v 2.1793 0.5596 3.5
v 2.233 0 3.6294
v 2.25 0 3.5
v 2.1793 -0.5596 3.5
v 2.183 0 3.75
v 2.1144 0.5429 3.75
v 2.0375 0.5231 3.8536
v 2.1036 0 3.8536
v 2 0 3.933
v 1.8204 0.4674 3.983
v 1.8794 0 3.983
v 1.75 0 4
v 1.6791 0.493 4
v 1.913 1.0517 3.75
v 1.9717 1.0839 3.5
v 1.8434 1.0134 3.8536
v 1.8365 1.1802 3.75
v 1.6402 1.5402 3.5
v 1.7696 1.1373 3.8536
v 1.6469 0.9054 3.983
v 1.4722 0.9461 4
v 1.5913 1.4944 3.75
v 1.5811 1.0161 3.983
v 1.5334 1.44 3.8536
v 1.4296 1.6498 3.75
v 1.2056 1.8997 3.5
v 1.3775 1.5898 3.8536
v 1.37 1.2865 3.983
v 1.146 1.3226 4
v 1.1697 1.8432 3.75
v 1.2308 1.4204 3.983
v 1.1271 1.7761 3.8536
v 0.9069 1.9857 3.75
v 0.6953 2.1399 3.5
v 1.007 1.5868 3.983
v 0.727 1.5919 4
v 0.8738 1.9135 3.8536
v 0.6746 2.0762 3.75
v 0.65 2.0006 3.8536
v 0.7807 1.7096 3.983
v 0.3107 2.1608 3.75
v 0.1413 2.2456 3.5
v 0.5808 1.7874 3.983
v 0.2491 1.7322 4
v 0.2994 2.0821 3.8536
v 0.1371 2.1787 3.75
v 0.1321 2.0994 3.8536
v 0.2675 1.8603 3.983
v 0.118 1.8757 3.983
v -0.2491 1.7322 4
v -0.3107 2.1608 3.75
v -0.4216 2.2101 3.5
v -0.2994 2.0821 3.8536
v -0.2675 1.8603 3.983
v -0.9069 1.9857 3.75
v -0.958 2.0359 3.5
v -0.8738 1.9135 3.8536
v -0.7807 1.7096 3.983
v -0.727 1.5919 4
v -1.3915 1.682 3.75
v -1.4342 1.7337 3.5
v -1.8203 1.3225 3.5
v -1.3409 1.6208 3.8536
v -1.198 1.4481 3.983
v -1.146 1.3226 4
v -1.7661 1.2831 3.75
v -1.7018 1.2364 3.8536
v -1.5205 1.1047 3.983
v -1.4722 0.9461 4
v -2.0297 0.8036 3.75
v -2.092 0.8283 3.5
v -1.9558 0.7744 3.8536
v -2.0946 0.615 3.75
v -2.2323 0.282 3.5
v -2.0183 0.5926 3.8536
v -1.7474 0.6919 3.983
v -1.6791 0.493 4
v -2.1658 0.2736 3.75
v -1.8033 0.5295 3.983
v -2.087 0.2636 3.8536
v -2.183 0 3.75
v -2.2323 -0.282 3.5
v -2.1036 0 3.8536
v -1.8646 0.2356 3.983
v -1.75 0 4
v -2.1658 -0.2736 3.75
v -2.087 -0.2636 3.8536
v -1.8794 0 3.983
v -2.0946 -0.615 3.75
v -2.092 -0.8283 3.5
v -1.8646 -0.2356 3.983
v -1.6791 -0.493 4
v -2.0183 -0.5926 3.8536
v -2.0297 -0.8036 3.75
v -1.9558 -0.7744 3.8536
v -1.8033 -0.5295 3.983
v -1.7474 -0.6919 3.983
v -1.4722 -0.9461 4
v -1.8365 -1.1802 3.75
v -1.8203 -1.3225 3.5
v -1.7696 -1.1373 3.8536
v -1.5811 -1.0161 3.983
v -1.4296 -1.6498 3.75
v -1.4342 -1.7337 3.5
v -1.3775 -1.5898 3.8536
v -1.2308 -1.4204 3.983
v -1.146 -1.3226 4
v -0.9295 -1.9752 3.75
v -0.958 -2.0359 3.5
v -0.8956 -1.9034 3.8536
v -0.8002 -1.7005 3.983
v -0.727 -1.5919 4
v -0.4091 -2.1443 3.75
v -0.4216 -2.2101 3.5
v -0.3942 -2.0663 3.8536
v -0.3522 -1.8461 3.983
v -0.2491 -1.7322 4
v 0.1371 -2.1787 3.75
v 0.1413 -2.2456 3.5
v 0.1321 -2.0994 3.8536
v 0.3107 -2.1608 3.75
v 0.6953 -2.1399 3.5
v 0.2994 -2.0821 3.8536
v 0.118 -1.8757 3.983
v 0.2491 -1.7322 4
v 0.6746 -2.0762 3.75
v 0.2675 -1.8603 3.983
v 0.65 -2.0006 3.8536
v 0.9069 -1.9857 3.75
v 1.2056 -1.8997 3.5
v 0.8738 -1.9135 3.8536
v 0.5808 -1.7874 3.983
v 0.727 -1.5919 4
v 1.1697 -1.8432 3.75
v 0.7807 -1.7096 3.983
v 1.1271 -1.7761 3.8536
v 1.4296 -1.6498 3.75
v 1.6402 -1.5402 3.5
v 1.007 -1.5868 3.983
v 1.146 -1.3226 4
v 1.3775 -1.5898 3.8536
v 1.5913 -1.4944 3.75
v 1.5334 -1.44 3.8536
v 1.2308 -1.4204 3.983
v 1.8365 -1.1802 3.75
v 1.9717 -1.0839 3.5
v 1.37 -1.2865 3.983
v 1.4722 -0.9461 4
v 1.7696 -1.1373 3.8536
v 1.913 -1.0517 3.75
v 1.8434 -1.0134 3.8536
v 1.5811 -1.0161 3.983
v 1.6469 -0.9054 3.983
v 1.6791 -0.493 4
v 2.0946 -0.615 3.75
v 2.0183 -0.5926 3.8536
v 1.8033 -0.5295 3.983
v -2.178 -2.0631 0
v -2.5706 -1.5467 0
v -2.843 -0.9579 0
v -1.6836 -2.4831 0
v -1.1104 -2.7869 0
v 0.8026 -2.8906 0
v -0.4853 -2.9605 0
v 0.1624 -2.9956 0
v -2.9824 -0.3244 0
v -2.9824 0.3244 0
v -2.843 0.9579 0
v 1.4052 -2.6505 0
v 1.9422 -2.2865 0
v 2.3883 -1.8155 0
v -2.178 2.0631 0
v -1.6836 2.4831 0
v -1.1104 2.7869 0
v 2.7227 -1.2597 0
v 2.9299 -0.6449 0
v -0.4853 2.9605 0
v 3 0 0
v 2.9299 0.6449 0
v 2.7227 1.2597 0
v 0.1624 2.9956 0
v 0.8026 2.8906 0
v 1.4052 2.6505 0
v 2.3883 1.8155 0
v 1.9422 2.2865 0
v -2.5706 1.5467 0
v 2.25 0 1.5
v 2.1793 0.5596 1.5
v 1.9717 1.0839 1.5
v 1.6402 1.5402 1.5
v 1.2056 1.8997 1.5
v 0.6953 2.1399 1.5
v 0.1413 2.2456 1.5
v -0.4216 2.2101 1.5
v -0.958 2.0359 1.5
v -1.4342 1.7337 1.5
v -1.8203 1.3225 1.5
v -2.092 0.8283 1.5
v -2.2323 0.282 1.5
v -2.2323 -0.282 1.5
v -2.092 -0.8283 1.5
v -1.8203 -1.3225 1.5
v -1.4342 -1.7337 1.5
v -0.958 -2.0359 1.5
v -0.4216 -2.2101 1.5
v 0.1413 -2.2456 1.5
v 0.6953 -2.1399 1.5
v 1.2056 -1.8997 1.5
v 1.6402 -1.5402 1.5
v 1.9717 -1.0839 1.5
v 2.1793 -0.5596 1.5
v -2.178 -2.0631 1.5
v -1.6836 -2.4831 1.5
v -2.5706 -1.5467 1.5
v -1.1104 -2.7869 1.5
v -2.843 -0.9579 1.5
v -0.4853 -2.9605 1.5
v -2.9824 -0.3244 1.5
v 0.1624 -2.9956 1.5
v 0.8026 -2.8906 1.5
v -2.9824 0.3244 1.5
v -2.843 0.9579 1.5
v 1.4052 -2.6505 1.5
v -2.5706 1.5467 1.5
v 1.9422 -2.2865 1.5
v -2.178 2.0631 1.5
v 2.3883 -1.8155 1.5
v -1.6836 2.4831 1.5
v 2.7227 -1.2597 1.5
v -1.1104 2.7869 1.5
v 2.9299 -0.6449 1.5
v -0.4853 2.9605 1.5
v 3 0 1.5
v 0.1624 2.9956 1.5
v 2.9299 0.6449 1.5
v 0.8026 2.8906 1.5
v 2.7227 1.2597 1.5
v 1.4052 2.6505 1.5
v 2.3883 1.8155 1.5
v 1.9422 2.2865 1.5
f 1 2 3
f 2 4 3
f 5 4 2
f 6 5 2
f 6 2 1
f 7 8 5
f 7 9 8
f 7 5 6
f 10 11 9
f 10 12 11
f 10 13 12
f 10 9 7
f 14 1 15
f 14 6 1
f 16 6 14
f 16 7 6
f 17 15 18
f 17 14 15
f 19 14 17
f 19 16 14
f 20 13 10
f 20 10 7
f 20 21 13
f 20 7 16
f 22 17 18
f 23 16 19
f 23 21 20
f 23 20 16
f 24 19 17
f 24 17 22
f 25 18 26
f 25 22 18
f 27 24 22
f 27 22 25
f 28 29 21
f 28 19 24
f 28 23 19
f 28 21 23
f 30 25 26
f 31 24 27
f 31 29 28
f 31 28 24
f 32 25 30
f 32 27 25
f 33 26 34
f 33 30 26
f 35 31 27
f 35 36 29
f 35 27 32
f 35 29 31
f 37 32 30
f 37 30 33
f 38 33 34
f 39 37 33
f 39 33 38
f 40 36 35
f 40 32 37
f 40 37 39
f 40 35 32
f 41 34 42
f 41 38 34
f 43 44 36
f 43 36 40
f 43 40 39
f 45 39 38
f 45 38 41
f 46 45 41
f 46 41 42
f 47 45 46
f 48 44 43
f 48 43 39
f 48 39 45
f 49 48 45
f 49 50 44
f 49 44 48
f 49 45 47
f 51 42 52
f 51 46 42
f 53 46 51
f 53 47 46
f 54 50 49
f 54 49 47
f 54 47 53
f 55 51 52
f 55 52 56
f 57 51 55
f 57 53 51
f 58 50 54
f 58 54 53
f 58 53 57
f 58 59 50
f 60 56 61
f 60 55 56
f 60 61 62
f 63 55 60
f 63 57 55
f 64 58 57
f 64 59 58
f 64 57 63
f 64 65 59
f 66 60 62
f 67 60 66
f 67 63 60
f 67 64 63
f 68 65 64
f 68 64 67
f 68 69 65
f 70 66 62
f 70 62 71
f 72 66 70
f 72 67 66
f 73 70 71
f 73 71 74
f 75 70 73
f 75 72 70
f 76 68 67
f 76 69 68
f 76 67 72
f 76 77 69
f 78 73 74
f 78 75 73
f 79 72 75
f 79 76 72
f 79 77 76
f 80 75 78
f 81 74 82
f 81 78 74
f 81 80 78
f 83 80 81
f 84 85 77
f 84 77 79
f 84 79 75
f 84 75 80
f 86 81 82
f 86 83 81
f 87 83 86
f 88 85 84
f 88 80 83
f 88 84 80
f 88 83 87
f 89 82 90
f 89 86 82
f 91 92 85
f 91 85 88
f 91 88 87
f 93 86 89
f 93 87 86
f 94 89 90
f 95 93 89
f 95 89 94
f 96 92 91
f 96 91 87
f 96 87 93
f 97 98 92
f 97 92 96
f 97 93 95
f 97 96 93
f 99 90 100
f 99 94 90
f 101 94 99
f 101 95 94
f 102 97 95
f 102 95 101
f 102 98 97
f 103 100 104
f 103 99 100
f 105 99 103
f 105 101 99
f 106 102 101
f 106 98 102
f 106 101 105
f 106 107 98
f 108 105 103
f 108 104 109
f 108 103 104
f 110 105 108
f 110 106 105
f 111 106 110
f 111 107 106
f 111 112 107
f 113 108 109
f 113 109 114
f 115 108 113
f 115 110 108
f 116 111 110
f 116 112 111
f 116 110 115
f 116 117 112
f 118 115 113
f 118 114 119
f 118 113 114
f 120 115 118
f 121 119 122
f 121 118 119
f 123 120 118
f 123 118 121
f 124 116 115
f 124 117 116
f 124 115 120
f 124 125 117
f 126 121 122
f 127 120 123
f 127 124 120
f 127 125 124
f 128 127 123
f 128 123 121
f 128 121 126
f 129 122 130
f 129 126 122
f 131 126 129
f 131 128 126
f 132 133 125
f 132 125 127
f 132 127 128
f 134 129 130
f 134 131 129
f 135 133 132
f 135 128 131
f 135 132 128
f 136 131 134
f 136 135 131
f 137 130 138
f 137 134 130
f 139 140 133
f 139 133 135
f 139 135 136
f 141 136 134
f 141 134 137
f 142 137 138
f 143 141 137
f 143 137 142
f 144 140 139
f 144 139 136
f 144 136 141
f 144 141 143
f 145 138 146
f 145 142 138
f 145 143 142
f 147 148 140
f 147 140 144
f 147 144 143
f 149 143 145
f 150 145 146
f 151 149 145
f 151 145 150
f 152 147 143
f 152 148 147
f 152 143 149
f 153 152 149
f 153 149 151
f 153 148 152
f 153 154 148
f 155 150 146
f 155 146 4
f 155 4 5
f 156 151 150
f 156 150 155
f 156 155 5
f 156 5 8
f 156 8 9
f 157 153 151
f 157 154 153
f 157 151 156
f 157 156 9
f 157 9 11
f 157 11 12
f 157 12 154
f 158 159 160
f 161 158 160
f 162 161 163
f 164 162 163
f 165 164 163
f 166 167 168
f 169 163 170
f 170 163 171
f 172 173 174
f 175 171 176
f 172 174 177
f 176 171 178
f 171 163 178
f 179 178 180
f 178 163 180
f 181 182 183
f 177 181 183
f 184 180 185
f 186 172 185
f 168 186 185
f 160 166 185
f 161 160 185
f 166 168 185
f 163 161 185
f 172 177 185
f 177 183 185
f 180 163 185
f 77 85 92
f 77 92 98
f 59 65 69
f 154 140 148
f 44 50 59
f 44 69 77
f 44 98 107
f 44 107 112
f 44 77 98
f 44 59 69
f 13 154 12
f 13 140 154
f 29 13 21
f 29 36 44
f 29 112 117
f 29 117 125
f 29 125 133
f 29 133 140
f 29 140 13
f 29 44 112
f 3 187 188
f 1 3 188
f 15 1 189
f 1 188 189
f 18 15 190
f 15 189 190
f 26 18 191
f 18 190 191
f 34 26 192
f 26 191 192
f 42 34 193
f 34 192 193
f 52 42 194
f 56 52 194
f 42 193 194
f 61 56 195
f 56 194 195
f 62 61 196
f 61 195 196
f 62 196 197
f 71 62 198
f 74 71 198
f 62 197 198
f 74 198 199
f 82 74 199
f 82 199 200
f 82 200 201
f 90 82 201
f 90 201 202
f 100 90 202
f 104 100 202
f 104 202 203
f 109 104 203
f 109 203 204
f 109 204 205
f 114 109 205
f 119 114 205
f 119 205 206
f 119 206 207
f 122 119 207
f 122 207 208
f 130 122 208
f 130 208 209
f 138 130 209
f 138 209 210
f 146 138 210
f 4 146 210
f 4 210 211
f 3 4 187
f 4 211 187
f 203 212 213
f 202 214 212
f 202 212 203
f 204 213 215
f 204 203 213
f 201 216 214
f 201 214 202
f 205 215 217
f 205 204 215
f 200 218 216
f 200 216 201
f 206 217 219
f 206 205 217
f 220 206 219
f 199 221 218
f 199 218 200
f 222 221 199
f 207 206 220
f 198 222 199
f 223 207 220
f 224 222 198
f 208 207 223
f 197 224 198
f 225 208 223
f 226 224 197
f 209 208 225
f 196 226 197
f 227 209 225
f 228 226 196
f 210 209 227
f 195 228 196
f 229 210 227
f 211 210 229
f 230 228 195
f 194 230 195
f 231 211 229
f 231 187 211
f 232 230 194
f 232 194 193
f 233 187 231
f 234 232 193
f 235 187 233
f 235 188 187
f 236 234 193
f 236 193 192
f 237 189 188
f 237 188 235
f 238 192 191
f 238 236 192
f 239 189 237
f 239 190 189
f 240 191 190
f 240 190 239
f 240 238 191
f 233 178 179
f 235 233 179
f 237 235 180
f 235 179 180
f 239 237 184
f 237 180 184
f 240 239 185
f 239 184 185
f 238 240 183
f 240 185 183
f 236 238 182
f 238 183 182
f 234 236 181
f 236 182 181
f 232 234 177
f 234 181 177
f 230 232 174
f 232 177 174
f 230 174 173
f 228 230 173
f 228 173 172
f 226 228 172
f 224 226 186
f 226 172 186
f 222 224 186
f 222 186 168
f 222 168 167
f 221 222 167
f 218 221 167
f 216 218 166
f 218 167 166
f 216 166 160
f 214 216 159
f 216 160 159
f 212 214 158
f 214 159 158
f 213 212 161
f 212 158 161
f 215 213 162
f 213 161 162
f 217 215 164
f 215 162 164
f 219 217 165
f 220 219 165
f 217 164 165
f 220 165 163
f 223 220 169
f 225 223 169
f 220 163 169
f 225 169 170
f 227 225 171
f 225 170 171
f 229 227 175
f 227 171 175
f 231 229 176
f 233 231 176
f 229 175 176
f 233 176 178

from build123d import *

# Parameters (mm, degrees)
F0_R     = 3
F0_R_2   = 2.25
F1_DEPTH = 1.5
F2_DEPTH = 4
F3_R     = 0.5


with BuildPart() as f1:
    # F0 (on Top) → F1 (new body)
    with BuildSketch(Plane.XY):
        Circle(F0_R)
        Circle(F0_R_2, mode=Mode.SUBTRACT)
        Circle(F0_R_2)
    extrude(amount=F1_DEPTH)

    # F0 (on Top) → F2 (join)
    with BuildSketch(Plane.XY):
        Circle(F0_R_2)
    extrude(amount=F2_DEPTH)

    # F3
    f3_edges = [f1.edges().sort_by_distance(p)[0] for p in [
        (-2.25, 0, 4),
    ]]
    fillet(f3_edges, radius=F3_R)


solid = f1.part
